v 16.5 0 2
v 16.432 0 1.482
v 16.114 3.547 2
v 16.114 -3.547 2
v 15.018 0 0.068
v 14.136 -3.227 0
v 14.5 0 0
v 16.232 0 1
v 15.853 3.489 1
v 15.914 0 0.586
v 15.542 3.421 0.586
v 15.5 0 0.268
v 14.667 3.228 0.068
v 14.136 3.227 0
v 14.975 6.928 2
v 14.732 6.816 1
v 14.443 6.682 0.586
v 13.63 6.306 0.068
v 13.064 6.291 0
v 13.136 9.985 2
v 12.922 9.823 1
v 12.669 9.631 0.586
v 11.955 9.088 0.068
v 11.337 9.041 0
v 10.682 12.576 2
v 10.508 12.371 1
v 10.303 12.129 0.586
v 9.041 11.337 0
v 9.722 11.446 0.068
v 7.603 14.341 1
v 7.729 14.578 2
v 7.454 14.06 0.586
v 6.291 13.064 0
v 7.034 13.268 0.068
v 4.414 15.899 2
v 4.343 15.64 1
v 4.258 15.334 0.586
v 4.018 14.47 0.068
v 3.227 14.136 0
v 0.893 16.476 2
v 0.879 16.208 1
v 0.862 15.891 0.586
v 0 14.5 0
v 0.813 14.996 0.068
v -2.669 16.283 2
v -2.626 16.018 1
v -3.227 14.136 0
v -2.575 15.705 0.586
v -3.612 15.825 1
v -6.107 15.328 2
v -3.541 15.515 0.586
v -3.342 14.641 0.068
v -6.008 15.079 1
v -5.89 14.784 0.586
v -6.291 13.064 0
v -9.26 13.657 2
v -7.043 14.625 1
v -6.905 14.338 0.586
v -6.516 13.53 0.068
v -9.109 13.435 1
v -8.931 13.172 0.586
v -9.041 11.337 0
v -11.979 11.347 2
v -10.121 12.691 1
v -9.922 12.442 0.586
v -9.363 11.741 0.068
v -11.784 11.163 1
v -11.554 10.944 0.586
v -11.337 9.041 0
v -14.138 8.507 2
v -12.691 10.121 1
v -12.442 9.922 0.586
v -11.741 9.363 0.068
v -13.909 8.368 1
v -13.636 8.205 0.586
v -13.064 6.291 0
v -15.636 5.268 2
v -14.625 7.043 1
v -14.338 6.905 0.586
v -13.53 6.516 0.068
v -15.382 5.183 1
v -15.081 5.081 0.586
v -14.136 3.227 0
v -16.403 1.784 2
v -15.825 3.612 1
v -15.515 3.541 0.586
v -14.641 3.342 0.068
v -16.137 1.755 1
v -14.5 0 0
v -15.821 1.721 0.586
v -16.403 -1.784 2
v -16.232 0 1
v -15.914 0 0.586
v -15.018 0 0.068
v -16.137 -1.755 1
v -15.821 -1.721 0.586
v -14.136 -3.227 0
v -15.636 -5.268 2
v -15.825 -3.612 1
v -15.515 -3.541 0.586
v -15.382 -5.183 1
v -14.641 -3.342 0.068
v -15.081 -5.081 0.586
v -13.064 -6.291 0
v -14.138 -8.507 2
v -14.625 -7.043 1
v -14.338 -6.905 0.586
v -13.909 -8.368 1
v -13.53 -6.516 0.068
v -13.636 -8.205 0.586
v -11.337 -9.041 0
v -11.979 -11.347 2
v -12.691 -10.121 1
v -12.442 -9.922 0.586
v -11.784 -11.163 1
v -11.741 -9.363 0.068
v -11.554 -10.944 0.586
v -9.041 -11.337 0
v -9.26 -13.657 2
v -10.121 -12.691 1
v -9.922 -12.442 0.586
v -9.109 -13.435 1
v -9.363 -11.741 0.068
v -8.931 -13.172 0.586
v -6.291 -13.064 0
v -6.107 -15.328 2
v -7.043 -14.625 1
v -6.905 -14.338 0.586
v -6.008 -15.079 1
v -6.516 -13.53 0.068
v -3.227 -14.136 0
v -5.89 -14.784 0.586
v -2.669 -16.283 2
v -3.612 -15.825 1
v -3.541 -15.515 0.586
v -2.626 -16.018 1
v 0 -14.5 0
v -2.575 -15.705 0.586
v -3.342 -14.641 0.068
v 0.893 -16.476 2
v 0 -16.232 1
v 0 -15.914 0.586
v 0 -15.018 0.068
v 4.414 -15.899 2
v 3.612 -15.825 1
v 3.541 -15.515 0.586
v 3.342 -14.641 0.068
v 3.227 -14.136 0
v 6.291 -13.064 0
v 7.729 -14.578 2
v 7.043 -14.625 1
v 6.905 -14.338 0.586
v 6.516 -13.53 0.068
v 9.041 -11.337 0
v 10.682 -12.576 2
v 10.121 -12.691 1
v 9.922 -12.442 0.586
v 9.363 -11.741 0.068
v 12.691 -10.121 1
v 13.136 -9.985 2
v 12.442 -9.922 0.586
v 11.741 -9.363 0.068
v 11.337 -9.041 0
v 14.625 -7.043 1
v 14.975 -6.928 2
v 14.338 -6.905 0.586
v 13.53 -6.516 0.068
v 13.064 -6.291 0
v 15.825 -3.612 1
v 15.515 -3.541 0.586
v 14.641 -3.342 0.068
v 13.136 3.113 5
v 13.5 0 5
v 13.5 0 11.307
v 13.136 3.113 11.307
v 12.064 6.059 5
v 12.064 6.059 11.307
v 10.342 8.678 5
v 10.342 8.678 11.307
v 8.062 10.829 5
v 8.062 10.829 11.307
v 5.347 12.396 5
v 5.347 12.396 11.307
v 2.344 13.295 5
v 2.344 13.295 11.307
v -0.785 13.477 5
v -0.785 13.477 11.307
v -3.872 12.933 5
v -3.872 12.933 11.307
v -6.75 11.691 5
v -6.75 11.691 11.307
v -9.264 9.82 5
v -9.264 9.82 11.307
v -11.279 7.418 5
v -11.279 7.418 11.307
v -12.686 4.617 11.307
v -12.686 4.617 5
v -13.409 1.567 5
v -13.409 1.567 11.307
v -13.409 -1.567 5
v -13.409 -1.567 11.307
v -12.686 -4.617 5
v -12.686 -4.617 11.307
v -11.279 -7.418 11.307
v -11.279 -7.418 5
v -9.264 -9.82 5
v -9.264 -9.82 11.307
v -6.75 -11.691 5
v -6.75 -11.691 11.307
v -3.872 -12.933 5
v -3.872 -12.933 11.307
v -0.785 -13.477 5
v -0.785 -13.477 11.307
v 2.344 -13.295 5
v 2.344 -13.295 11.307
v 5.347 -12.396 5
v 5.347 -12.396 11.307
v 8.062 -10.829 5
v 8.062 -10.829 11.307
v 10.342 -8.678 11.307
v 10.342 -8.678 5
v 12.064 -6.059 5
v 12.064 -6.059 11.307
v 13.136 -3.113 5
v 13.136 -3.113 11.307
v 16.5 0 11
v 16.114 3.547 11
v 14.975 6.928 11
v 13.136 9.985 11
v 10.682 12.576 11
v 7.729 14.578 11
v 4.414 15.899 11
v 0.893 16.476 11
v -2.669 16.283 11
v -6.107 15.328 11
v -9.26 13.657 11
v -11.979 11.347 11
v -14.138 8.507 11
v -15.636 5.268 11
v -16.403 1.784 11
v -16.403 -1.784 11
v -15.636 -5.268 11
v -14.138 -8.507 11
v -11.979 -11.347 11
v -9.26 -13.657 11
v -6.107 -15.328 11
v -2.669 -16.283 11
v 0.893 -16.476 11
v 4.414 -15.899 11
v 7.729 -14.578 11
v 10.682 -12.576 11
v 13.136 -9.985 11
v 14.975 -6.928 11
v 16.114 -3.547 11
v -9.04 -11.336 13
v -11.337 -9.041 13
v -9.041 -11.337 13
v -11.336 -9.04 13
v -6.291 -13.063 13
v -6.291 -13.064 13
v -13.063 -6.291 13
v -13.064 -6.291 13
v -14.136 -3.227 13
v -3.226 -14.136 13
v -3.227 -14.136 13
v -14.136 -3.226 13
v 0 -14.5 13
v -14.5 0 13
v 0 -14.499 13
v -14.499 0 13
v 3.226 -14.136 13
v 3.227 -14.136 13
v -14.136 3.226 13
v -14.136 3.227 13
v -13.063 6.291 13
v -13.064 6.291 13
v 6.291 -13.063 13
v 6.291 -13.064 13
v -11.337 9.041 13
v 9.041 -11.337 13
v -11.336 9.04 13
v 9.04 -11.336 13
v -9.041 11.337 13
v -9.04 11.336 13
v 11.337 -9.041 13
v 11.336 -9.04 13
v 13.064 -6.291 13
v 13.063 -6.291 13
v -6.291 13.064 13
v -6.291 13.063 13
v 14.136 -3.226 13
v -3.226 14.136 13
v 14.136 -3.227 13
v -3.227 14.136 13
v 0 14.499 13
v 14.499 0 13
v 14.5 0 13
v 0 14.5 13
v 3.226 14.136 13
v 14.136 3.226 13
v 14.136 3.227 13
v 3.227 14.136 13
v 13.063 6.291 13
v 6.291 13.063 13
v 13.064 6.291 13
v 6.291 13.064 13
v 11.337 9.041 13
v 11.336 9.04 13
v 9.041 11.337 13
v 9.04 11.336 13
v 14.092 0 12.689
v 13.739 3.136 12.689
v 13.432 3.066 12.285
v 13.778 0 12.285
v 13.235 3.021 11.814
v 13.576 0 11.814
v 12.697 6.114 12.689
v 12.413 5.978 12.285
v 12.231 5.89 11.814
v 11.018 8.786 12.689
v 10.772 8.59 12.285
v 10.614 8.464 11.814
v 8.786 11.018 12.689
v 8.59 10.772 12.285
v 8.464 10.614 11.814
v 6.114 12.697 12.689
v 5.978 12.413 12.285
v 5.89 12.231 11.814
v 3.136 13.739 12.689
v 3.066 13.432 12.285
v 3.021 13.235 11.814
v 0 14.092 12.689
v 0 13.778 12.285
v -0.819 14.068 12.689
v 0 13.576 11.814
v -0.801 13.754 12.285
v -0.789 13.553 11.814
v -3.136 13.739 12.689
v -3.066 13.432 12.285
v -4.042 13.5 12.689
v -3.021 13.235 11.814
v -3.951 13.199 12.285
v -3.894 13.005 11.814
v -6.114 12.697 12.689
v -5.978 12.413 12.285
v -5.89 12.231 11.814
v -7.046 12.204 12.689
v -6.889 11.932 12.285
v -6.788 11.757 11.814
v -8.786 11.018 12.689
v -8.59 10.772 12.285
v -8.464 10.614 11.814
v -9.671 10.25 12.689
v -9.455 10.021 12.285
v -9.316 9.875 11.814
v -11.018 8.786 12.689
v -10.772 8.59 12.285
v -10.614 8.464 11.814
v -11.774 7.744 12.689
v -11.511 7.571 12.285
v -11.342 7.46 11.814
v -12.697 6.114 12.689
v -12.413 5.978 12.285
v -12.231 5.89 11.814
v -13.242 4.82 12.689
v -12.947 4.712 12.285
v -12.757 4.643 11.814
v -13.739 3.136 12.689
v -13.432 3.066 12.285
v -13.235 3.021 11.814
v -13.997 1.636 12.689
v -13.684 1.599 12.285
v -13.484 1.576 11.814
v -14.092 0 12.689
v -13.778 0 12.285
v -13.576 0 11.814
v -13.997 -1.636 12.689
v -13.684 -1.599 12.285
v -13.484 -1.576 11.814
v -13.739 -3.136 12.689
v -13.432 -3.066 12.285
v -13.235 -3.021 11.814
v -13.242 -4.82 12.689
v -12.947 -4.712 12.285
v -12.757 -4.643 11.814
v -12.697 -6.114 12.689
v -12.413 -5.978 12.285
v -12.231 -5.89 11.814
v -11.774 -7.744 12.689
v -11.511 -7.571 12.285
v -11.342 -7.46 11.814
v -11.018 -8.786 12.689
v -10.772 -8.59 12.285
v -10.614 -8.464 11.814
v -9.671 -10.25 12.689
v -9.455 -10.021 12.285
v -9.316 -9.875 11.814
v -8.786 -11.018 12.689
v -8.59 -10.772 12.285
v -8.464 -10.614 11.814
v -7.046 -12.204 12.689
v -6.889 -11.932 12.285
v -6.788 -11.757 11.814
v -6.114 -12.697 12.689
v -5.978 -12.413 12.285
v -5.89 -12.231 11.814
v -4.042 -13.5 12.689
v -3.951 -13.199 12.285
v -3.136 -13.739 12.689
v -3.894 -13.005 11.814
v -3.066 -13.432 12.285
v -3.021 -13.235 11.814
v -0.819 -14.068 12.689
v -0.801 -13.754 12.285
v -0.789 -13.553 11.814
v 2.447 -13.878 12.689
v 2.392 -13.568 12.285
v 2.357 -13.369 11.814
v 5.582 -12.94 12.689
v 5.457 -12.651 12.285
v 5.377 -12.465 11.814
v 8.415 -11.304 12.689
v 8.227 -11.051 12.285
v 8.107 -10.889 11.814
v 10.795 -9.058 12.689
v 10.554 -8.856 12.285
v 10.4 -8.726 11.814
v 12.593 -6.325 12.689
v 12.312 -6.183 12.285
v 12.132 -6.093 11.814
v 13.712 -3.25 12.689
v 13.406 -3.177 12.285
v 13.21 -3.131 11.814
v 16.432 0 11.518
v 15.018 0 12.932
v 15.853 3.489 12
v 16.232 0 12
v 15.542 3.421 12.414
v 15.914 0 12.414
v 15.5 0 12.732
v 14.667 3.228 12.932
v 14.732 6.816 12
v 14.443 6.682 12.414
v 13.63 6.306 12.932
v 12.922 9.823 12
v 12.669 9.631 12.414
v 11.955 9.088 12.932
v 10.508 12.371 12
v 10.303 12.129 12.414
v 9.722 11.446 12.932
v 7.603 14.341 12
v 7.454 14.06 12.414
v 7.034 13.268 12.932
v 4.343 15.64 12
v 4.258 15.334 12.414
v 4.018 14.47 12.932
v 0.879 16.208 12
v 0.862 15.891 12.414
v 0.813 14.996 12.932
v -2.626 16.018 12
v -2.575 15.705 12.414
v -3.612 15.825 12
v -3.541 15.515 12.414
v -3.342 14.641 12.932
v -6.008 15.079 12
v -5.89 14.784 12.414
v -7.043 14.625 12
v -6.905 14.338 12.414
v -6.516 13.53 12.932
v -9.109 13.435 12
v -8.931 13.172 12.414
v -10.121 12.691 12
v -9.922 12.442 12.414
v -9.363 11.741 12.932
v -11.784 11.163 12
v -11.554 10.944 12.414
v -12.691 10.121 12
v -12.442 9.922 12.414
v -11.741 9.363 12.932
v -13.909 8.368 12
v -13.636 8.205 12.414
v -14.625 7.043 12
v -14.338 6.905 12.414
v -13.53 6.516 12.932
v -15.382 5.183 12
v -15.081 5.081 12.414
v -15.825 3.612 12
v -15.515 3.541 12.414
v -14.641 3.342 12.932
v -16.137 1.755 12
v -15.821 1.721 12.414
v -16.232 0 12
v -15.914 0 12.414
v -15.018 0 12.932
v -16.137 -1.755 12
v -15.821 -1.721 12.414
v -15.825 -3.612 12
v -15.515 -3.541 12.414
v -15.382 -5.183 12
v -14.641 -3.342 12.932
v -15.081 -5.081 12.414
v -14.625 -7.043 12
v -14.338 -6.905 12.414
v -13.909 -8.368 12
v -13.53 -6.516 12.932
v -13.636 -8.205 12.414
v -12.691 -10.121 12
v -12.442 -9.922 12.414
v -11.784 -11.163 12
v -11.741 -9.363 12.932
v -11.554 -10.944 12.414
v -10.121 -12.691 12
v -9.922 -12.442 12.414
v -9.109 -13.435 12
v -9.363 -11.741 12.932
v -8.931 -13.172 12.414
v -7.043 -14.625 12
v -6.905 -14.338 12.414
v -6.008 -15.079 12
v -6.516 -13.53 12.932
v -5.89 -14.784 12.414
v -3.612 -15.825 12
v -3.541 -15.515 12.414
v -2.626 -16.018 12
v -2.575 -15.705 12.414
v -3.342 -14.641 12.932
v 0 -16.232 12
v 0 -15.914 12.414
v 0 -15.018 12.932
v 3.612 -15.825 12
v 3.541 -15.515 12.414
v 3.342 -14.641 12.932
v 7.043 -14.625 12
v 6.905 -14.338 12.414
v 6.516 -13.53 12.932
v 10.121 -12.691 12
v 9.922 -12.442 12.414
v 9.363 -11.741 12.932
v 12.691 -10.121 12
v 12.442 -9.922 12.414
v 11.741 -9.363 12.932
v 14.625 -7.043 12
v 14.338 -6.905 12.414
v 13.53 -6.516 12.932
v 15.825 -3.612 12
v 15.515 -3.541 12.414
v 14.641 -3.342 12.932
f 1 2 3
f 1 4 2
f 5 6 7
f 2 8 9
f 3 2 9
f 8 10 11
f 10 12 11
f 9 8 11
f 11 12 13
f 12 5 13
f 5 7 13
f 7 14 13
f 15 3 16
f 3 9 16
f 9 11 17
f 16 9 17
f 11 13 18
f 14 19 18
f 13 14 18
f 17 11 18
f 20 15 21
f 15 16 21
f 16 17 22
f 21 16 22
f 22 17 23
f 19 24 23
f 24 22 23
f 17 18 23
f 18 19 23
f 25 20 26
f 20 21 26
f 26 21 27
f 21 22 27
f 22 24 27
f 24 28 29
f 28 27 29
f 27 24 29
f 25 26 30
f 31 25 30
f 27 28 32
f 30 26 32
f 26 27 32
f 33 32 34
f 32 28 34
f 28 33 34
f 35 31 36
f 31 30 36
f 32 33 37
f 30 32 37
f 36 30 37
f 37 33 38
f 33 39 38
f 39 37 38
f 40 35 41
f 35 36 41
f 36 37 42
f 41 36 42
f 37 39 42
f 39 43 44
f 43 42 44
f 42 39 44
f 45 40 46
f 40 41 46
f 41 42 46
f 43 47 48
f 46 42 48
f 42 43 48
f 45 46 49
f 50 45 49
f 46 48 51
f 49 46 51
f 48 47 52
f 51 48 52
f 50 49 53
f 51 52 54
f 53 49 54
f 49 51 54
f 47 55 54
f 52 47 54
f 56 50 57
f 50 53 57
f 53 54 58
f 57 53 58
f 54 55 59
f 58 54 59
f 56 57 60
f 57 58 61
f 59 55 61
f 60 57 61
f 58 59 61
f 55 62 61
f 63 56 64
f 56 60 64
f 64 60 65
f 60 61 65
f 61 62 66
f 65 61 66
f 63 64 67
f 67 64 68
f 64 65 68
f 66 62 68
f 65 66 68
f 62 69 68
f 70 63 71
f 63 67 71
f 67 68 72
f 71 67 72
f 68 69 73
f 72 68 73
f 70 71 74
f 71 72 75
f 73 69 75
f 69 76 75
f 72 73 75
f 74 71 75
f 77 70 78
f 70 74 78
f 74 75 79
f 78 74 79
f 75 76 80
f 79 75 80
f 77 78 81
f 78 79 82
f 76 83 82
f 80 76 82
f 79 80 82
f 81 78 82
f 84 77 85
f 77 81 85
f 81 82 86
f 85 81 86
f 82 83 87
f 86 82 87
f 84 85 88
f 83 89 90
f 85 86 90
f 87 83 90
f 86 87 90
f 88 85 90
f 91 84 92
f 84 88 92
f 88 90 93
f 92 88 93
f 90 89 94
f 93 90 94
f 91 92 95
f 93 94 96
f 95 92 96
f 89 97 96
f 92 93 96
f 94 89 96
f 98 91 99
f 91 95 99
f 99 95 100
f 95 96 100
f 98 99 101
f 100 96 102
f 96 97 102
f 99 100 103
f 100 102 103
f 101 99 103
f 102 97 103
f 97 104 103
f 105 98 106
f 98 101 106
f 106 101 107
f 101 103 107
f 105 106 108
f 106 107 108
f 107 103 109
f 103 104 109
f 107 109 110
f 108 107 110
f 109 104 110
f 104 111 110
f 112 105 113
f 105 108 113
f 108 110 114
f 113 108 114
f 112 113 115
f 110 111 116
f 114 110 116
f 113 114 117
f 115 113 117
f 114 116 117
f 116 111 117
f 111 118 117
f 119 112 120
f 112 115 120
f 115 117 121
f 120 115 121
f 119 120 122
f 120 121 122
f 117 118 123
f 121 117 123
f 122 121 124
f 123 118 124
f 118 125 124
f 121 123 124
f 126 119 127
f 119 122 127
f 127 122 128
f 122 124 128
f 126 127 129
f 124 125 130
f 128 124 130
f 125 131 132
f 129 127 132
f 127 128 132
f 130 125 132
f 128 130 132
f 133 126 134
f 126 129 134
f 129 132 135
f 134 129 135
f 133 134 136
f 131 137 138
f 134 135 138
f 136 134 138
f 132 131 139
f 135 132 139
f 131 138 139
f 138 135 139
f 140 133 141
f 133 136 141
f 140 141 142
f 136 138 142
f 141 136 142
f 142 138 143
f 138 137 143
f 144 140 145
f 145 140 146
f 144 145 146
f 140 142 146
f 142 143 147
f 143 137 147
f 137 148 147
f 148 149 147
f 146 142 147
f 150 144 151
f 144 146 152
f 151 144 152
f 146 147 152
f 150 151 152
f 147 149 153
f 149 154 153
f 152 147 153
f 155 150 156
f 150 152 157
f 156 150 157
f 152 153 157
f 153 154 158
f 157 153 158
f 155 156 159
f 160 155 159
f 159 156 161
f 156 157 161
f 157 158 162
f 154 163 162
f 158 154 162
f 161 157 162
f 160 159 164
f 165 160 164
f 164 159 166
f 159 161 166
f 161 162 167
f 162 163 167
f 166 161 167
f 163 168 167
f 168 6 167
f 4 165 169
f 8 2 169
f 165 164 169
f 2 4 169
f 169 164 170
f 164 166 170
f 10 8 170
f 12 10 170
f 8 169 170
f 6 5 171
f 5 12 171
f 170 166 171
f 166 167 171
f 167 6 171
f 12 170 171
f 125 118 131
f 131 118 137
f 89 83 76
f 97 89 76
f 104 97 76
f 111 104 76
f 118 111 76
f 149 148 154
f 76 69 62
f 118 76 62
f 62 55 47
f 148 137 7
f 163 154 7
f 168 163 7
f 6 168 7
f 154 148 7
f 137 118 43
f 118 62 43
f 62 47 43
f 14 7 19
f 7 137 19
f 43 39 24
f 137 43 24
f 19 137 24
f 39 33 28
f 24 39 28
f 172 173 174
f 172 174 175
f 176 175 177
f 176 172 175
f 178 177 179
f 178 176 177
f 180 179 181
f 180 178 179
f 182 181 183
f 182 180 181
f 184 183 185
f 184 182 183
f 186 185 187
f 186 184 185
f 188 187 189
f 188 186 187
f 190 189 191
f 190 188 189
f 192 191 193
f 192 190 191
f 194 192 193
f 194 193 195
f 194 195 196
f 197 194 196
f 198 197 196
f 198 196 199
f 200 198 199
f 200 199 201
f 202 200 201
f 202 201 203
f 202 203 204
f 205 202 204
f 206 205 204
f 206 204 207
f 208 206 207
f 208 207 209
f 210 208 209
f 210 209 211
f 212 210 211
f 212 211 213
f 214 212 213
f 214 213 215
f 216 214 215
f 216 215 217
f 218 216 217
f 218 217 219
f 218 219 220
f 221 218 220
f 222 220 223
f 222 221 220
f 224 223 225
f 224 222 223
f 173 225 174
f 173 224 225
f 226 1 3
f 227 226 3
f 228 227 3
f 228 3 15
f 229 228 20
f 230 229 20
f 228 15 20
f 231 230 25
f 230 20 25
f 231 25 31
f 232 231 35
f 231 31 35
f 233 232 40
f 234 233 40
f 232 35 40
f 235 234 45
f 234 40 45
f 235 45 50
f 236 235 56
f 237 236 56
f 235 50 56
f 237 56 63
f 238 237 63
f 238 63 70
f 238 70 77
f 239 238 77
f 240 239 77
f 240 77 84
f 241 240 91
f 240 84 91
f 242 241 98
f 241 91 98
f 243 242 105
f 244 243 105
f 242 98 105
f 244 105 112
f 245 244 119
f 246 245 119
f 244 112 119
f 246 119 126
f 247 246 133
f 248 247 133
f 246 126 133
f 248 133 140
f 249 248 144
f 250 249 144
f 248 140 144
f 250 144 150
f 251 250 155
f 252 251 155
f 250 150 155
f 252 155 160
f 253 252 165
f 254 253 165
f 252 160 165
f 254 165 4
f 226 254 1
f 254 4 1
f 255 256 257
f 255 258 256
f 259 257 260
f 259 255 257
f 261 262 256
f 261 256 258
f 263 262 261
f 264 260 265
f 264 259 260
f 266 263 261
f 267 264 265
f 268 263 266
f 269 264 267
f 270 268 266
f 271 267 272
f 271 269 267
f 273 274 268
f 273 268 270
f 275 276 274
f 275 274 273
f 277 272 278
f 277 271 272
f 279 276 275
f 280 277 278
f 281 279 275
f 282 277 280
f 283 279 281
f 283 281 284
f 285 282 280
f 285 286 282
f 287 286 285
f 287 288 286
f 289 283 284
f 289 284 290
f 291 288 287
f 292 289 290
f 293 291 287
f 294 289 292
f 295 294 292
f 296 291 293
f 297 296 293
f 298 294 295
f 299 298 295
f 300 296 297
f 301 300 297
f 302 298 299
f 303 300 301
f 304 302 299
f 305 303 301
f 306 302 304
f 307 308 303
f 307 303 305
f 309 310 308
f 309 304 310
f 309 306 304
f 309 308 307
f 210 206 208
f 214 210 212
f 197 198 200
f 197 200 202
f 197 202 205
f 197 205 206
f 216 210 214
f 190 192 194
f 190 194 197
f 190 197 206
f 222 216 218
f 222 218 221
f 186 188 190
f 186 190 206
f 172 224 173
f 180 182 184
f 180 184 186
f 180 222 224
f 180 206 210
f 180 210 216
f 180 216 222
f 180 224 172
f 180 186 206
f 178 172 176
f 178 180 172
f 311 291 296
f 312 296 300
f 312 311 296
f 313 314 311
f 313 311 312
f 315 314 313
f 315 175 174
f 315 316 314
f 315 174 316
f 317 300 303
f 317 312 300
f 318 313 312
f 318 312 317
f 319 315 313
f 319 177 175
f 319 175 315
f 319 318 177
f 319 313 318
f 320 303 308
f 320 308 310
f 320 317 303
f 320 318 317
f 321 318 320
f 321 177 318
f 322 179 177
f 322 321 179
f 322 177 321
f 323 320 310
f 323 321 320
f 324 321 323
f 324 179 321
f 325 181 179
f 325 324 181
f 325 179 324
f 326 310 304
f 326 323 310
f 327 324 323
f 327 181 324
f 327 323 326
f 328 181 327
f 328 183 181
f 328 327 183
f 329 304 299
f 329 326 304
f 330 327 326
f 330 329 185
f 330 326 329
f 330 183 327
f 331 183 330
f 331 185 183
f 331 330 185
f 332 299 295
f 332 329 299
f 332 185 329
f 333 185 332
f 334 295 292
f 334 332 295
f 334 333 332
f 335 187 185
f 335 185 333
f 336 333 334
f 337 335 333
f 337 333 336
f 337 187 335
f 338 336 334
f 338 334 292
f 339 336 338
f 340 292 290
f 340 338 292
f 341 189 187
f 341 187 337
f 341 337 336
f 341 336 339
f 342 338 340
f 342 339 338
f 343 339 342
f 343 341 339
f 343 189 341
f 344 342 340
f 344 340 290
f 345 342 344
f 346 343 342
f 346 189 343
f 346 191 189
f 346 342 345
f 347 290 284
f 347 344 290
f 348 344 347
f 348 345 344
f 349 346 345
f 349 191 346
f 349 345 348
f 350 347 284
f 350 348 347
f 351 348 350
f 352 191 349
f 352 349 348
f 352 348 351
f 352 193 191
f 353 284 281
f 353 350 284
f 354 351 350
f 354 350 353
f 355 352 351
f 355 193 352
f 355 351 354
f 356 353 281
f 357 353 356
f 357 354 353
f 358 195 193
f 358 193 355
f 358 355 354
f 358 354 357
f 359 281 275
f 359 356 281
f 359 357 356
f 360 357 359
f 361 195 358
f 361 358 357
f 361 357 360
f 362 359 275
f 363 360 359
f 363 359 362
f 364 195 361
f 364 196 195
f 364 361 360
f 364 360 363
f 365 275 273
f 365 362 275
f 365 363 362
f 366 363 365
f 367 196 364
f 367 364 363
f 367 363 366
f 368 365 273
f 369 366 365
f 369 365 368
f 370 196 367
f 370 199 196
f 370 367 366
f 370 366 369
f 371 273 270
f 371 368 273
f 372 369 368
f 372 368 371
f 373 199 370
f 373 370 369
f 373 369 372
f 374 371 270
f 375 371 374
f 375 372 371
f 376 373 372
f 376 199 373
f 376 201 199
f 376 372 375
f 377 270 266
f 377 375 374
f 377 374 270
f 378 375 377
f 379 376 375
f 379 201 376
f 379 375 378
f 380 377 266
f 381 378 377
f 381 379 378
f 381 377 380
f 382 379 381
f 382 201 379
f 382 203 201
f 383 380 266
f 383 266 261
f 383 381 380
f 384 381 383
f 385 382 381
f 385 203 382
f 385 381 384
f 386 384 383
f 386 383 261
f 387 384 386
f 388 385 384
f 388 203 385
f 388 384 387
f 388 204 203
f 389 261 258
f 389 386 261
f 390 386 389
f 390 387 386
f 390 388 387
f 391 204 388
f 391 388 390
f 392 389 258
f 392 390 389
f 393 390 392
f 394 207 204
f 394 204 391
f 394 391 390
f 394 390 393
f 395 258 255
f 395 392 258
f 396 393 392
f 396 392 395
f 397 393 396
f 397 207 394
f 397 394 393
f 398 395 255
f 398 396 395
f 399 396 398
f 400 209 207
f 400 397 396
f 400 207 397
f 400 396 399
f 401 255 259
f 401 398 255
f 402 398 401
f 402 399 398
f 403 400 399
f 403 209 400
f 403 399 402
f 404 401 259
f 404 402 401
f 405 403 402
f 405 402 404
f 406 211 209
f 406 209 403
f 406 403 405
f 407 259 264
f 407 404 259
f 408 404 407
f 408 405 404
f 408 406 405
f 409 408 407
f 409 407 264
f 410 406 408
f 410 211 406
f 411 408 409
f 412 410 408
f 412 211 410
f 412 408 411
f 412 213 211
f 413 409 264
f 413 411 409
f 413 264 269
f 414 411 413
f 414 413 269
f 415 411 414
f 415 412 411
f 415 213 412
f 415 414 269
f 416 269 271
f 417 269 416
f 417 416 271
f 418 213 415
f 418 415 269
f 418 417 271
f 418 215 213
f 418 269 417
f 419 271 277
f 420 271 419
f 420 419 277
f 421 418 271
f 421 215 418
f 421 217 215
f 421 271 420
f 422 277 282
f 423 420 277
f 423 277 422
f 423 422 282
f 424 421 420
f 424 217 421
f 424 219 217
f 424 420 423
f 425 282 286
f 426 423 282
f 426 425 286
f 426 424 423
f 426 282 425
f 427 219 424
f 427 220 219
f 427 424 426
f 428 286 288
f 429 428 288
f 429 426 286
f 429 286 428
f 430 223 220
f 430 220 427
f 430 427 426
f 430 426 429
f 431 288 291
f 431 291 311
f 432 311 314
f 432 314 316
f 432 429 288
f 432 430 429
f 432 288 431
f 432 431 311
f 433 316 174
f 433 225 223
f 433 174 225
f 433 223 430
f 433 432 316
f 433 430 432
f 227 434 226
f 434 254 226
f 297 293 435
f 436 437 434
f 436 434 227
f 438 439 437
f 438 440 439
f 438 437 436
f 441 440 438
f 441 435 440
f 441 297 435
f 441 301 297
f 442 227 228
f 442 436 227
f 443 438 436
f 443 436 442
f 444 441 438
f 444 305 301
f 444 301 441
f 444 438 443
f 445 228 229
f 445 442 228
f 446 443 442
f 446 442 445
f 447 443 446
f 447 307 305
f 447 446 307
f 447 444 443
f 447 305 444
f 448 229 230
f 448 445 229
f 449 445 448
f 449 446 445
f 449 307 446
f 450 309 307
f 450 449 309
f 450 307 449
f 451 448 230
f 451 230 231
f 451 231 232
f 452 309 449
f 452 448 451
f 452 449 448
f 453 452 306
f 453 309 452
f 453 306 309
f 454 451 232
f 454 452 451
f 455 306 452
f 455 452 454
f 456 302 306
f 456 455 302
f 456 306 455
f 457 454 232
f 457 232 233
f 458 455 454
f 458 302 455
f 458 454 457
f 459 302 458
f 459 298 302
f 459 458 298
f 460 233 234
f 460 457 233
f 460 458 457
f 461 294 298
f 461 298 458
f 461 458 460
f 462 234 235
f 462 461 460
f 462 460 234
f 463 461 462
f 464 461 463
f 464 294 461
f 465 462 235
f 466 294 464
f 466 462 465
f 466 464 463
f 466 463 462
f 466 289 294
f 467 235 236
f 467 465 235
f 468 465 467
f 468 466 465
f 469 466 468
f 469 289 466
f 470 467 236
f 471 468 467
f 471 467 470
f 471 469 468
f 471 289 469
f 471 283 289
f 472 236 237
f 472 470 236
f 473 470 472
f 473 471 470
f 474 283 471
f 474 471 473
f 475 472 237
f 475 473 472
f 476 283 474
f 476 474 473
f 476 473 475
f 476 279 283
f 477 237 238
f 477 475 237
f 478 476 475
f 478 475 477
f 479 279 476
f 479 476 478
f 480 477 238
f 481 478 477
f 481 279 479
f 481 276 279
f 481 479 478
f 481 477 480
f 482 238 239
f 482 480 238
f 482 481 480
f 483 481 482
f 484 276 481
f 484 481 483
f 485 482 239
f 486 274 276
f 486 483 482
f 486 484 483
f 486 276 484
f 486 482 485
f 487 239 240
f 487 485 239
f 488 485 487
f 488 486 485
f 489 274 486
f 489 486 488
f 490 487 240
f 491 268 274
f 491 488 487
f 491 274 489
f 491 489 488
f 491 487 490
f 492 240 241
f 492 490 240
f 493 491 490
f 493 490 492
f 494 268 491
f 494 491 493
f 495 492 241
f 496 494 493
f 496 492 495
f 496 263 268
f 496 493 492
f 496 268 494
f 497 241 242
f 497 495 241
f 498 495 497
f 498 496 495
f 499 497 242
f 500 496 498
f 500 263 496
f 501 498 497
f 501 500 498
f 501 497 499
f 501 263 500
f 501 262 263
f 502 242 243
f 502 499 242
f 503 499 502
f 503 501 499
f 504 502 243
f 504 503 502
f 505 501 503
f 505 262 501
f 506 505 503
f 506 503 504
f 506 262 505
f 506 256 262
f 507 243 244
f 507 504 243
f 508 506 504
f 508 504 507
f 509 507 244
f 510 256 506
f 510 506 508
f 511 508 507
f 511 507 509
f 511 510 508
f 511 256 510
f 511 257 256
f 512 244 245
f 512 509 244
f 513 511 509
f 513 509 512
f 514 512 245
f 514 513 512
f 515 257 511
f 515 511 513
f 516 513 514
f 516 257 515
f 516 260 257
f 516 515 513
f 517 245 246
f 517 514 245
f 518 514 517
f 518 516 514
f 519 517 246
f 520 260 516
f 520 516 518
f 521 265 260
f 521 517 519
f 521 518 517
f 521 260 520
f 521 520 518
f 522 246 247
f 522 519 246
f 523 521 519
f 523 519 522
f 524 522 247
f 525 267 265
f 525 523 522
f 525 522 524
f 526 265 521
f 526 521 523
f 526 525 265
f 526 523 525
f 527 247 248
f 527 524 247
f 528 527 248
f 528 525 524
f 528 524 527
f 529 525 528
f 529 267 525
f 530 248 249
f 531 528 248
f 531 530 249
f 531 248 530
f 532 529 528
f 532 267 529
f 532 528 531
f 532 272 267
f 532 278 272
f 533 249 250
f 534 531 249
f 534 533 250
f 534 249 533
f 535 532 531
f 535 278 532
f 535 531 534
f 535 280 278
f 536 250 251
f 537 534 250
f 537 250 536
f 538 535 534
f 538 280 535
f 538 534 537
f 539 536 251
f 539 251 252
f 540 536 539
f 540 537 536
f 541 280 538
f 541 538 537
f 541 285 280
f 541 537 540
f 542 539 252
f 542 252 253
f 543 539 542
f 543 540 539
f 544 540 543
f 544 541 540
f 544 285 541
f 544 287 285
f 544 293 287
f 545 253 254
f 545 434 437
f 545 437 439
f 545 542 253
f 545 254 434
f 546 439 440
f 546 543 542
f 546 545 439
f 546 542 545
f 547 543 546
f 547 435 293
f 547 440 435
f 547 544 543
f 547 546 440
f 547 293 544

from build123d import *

# Parameters (mm, degrees)
F0_R     = 13.5
F1_DEPTH = 5
F0_R_2   = 16.5
F2_DEPTH = 13
F3_R     = 2


# Not quite as in the source:
# - a fillet or chamfer that OpenCascade refuses, or shapes differently, is made with other operations: its cross-section is extruded or revolved along the edge and cut away or added


with BuildPart() as f1:
    # F0 (on Top) → F1 (new body)
    with BuildSketch(Plane.XY):
        Circle(F0_R)
    extrude(amount=F1_DEPTH)

    # F0 (on Top) → F2 (join)
    with BuildSketch(Plane.XY):
        Circle(F0_R_2)
        Circle(F0_R, mode=Mode.SUBTRACT)
    extrude(amount=F2_DEPTH)

    # F3
    f3_edges = [f1.edges().sort_by_distance(p)[0] for p in [
        (-16.5, 0, 13),
        (-16.5, 0, 0),
    ]]
    fillet(f3_edges, radius=F3_R)

    # F4: fillet of radius 2 on 1 edges, made by hand

    # F4_s1 → F4_t2 (revolve, cut)
    with BuildSketch(Plane.XZ):
        with BuildLine():
            ThreePointArc((14.4997999035, 13.0003463544), (13.7675927526, 12.2678330874), (13.4996, 11.2673917434))
            Line((13.4996, 11.2673917434), (13.2994634315, 11.2673917434))
            ThreePointArc((13.2994634315, 11.2673917434), (13.2998634315, 12.1336958717), (13.2998634315, 13))
            Line((13.2998634315, 13), (13.5, 13.2001365685))
            ThreePointArc((13.5, 13.2001365685), (13.9998999517, 13.2001365685), (14.3996833253, 13.1736418155))
            Line((14.3996833253, 13.1736418155), (14.4997999035, 13.0003463544))
        make_face()
    revolve(axis=Axis((0, 0, 13), (0, 0, 1)), mode=Mode.SUBTRACT)


with BuildPart() as f5_1:
    # F5: copy of F1
    add(f1.part)


with BuildPart() as f7_1:
    # F7: copy of F1
    add(f1.part.moved(Location((0, 36, 0))))


with BuildPart() as f8_1:
    # F8: copy of F1
    add(f1.part.moved(Location((36.3, 0, 0))))


with BuildPart() as f9_1:
    # F9: copy of F8_1
    add(f8_1.part.moved(Location((-0.4, 35.2, 0))))


solid = f1.part
